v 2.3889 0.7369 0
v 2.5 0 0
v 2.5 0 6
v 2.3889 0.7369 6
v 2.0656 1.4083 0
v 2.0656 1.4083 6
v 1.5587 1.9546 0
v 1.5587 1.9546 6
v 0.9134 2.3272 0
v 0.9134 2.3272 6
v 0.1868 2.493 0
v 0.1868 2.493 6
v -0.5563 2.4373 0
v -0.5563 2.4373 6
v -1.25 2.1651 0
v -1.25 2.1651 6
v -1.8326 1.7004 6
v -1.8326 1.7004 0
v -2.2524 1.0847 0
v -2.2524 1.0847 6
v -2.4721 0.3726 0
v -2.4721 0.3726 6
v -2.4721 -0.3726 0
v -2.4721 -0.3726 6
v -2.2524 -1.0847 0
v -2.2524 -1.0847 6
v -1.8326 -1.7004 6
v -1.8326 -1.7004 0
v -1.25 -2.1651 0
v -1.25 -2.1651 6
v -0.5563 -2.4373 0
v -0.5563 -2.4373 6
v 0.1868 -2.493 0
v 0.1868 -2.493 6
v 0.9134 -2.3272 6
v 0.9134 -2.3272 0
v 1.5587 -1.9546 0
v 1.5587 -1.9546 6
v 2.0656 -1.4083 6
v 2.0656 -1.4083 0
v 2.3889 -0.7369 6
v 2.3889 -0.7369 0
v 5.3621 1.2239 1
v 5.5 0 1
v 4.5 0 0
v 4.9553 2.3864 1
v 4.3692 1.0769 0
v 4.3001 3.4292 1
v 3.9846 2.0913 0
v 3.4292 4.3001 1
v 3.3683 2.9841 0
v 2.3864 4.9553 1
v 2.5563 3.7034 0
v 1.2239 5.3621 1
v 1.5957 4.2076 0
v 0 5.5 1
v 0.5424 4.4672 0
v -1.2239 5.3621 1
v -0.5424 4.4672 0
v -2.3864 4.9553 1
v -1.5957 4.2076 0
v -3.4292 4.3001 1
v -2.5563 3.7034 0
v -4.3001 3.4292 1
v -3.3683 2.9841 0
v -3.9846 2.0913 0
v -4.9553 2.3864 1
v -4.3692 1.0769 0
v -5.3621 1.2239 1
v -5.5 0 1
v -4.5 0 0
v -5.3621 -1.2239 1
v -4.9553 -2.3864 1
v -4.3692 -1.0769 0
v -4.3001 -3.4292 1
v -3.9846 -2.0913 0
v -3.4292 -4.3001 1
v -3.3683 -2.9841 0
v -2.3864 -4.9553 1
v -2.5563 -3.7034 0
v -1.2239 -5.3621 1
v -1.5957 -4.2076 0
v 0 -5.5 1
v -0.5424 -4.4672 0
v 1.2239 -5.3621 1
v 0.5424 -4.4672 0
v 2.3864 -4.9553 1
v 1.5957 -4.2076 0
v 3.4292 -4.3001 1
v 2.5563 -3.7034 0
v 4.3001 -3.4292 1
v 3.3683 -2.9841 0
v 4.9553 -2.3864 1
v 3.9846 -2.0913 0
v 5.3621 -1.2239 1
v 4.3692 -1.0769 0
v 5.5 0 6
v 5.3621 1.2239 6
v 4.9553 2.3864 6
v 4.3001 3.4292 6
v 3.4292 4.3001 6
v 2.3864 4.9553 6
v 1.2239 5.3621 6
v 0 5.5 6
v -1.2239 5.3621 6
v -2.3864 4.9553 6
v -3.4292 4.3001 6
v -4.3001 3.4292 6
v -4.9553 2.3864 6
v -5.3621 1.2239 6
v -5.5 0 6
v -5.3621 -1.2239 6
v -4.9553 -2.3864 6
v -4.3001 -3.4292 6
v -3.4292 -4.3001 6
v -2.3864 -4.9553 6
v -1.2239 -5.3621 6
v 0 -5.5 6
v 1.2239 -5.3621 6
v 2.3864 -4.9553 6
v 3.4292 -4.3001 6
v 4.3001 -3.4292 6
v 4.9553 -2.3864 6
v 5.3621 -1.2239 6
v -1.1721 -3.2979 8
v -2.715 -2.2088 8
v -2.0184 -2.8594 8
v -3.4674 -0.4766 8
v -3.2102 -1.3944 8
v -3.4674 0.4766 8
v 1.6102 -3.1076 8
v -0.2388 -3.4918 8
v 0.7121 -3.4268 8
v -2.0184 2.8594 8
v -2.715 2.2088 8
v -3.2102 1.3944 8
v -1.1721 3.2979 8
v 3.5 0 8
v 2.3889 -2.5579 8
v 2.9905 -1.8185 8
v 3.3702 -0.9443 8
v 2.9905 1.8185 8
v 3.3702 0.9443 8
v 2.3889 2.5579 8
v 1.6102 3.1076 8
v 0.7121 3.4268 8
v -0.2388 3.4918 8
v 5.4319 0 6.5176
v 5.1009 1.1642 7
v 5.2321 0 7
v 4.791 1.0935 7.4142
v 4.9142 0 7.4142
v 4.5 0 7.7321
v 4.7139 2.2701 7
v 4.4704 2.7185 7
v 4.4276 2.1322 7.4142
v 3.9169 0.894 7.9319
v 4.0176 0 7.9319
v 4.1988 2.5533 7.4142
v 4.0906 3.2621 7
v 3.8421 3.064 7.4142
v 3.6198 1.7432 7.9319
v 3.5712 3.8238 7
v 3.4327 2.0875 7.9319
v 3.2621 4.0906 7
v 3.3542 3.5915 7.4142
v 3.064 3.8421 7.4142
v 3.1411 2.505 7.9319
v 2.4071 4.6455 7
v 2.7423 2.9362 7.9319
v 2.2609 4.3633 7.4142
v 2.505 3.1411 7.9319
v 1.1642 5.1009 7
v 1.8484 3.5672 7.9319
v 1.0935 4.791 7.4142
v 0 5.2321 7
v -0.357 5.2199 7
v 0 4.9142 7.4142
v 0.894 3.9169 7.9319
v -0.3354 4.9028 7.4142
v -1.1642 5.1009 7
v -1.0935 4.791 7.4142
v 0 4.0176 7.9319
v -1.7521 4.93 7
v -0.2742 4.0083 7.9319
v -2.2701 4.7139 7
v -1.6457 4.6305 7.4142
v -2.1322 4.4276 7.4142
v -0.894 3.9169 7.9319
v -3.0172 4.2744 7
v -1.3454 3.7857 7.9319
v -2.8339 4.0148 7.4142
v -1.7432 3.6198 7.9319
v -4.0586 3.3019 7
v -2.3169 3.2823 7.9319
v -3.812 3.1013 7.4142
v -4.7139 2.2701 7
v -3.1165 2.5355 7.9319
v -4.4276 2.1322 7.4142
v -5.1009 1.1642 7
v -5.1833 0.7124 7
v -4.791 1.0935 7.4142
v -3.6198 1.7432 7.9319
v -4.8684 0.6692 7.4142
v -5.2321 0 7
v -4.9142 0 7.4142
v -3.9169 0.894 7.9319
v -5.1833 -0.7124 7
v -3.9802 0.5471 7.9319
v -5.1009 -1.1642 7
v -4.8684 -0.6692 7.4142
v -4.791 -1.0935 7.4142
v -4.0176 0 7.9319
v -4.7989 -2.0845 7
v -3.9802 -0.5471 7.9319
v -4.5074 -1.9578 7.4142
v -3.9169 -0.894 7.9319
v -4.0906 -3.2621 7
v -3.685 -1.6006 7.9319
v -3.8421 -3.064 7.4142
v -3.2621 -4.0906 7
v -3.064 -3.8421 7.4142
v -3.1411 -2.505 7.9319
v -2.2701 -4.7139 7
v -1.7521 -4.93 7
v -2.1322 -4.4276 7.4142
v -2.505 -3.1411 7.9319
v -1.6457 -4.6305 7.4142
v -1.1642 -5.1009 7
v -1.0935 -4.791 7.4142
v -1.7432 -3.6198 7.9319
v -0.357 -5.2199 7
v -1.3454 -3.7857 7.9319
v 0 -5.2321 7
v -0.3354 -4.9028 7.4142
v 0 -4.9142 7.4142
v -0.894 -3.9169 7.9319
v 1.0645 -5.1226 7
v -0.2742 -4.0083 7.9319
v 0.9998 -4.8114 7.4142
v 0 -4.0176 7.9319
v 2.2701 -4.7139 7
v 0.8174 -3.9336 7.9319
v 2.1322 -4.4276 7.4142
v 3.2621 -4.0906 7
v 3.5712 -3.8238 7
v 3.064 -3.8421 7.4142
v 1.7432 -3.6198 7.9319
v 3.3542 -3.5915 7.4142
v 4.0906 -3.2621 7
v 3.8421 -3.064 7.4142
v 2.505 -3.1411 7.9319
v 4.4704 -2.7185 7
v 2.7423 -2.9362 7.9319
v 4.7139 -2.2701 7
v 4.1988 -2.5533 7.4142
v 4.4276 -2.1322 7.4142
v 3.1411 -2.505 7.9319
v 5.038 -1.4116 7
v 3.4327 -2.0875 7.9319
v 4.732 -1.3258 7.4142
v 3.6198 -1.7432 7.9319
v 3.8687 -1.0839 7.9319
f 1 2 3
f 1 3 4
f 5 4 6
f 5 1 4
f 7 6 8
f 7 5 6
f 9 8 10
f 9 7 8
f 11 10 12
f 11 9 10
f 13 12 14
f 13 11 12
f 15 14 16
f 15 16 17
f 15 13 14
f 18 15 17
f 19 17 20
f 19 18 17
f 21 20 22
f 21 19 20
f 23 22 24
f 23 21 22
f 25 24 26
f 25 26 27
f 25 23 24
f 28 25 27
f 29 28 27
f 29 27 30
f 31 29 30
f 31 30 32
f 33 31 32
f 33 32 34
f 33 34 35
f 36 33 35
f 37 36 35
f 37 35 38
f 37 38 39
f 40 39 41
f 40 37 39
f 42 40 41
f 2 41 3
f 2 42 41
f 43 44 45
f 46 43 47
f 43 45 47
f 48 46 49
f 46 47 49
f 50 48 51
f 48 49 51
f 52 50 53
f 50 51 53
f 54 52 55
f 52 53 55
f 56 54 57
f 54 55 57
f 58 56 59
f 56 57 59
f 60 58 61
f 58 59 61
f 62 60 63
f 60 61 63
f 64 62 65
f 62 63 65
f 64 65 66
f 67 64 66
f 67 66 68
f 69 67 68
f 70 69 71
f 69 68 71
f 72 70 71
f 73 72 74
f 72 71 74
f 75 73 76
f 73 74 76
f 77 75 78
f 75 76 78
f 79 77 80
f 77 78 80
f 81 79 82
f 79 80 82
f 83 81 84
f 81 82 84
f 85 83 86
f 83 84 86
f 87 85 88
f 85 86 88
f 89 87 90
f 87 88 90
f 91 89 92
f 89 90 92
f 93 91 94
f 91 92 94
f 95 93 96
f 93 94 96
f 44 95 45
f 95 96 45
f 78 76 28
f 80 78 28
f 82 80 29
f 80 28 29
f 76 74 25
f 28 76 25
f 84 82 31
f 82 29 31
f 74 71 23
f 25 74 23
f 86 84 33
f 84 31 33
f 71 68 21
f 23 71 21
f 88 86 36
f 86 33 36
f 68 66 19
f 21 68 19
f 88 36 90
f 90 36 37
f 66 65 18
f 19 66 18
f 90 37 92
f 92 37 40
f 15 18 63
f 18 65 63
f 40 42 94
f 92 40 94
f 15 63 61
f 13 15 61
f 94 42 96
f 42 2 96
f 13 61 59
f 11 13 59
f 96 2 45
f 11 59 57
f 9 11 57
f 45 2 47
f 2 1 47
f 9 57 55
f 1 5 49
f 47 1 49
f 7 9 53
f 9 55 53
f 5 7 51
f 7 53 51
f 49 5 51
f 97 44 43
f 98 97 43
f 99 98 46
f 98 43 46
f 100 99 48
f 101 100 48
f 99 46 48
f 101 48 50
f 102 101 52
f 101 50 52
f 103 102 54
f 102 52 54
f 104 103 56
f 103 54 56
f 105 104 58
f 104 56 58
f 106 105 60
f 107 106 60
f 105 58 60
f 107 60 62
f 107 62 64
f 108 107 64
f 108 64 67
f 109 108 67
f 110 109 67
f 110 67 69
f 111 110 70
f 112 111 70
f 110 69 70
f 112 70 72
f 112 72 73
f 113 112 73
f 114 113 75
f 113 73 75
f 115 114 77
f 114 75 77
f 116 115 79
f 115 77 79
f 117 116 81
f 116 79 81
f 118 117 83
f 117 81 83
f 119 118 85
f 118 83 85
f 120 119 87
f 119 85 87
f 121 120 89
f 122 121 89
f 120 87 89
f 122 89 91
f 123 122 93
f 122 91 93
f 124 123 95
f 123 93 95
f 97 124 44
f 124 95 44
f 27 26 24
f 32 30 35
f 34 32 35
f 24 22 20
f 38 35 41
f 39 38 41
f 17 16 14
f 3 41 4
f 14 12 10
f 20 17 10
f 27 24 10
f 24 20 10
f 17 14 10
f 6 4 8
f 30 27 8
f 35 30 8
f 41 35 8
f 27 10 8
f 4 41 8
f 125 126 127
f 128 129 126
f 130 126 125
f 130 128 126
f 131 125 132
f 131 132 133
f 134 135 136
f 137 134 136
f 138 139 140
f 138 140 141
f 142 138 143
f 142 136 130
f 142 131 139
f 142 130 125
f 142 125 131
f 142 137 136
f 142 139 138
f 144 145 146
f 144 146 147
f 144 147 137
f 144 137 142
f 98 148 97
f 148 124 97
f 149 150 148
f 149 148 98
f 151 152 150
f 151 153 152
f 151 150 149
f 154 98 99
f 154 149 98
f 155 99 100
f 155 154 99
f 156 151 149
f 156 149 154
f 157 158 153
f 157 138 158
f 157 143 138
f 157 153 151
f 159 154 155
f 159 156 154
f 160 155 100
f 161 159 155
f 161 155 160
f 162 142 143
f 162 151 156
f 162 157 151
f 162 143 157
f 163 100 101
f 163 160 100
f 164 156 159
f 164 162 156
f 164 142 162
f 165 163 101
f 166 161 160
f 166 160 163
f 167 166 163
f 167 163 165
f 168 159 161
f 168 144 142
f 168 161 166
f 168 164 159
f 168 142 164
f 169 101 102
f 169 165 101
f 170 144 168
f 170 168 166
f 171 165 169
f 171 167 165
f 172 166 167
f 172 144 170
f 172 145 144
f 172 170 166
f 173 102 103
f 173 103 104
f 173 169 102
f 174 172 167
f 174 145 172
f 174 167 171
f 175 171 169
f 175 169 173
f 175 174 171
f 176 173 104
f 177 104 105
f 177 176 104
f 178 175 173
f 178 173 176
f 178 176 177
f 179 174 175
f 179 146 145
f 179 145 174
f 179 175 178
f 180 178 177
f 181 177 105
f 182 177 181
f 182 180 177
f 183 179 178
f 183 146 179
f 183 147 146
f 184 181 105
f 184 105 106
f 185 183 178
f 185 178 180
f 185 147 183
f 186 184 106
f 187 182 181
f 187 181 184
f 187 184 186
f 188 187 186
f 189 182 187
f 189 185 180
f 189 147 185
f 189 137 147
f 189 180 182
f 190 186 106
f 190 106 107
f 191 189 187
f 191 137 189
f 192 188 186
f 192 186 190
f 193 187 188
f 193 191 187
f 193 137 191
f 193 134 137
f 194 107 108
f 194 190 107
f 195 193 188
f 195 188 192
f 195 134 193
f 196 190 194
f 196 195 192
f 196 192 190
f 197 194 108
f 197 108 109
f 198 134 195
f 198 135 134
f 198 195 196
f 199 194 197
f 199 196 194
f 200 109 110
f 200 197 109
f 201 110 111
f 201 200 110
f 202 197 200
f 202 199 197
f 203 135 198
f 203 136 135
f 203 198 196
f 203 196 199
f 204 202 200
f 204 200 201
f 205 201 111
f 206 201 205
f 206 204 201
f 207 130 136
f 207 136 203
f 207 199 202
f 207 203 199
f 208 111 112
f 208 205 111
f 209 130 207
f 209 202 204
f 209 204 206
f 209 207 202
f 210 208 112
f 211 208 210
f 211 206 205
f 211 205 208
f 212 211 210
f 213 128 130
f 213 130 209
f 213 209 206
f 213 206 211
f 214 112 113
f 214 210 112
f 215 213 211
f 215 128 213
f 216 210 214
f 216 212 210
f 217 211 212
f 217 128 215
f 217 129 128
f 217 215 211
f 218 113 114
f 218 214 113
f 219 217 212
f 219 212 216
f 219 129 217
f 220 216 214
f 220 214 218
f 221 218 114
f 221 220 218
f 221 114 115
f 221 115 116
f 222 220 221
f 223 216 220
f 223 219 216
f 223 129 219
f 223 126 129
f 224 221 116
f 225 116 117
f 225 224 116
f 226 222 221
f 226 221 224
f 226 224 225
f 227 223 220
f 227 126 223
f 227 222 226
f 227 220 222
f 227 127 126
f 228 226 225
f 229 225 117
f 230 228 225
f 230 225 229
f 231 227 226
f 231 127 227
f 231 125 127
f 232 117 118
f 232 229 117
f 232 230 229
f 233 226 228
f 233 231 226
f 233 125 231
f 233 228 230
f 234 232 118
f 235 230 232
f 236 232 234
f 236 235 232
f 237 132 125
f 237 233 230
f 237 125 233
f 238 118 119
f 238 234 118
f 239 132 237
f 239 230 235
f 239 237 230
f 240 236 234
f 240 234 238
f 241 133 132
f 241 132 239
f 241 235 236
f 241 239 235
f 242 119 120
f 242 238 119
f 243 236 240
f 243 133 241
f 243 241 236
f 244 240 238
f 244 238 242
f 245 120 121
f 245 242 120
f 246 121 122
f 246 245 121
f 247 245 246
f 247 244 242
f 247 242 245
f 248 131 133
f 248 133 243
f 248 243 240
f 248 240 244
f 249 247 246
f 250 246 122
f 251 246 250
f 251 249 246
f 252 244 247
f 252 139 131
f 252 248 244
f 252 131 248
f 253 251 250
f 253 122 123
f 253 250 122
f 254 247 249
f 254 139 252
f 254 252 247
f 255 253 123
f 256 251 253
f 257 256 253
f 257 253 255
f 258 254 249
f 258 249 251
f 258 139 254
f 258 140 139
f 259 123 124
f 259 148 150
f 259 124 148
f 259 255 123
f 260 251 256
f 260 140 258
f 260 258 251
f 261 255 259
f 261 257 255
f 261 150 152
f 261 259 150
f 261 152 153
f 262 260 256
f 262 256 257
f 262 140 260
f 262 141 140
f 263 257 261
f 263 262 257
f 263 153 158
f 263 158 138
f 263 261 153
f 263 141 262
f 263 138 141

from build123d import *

# Parameters (mm, degrees)
F0_R     = 5.5
F0_R_2   = 2.5
F1_DEPTH = 8
F2_R     = 2
F3_DEPTH = 6
F4_SIZE  = 1


with BuildPart() as f1:
    # F0 (on Top) → F1 (new body)
    with BuildSketch(Plane.XY):
        Circle(F0_R)
        Circle(F0_R_2, mode=Mode.SUBTRACT)
        Circle(F0_R_2)
    extrude(amount=F1_DEPTH)

    # F2
    f2_edges = [f1.edges().sort_by_distance(p)[0] for p in [
        (-5.5, 0, 8),
    ]]
    fillet(f2_edges, radius=F2_R)

    # F0 (on Top) → F3 (cut)
    with BuildSketch(Plane.XY):
        Circle(F0_R_2)
    extrude(amount=F3_DEPTH, mode=Mode.SUBTRACT)

    # F4
    f4_edges = [f1.edges().sort_by_distance(p)[0] for p in [
        (-5.5, 0, 0),
    ]]
    chamfer(f4_edges, length=F4_SIZE)


solid = f1.part
